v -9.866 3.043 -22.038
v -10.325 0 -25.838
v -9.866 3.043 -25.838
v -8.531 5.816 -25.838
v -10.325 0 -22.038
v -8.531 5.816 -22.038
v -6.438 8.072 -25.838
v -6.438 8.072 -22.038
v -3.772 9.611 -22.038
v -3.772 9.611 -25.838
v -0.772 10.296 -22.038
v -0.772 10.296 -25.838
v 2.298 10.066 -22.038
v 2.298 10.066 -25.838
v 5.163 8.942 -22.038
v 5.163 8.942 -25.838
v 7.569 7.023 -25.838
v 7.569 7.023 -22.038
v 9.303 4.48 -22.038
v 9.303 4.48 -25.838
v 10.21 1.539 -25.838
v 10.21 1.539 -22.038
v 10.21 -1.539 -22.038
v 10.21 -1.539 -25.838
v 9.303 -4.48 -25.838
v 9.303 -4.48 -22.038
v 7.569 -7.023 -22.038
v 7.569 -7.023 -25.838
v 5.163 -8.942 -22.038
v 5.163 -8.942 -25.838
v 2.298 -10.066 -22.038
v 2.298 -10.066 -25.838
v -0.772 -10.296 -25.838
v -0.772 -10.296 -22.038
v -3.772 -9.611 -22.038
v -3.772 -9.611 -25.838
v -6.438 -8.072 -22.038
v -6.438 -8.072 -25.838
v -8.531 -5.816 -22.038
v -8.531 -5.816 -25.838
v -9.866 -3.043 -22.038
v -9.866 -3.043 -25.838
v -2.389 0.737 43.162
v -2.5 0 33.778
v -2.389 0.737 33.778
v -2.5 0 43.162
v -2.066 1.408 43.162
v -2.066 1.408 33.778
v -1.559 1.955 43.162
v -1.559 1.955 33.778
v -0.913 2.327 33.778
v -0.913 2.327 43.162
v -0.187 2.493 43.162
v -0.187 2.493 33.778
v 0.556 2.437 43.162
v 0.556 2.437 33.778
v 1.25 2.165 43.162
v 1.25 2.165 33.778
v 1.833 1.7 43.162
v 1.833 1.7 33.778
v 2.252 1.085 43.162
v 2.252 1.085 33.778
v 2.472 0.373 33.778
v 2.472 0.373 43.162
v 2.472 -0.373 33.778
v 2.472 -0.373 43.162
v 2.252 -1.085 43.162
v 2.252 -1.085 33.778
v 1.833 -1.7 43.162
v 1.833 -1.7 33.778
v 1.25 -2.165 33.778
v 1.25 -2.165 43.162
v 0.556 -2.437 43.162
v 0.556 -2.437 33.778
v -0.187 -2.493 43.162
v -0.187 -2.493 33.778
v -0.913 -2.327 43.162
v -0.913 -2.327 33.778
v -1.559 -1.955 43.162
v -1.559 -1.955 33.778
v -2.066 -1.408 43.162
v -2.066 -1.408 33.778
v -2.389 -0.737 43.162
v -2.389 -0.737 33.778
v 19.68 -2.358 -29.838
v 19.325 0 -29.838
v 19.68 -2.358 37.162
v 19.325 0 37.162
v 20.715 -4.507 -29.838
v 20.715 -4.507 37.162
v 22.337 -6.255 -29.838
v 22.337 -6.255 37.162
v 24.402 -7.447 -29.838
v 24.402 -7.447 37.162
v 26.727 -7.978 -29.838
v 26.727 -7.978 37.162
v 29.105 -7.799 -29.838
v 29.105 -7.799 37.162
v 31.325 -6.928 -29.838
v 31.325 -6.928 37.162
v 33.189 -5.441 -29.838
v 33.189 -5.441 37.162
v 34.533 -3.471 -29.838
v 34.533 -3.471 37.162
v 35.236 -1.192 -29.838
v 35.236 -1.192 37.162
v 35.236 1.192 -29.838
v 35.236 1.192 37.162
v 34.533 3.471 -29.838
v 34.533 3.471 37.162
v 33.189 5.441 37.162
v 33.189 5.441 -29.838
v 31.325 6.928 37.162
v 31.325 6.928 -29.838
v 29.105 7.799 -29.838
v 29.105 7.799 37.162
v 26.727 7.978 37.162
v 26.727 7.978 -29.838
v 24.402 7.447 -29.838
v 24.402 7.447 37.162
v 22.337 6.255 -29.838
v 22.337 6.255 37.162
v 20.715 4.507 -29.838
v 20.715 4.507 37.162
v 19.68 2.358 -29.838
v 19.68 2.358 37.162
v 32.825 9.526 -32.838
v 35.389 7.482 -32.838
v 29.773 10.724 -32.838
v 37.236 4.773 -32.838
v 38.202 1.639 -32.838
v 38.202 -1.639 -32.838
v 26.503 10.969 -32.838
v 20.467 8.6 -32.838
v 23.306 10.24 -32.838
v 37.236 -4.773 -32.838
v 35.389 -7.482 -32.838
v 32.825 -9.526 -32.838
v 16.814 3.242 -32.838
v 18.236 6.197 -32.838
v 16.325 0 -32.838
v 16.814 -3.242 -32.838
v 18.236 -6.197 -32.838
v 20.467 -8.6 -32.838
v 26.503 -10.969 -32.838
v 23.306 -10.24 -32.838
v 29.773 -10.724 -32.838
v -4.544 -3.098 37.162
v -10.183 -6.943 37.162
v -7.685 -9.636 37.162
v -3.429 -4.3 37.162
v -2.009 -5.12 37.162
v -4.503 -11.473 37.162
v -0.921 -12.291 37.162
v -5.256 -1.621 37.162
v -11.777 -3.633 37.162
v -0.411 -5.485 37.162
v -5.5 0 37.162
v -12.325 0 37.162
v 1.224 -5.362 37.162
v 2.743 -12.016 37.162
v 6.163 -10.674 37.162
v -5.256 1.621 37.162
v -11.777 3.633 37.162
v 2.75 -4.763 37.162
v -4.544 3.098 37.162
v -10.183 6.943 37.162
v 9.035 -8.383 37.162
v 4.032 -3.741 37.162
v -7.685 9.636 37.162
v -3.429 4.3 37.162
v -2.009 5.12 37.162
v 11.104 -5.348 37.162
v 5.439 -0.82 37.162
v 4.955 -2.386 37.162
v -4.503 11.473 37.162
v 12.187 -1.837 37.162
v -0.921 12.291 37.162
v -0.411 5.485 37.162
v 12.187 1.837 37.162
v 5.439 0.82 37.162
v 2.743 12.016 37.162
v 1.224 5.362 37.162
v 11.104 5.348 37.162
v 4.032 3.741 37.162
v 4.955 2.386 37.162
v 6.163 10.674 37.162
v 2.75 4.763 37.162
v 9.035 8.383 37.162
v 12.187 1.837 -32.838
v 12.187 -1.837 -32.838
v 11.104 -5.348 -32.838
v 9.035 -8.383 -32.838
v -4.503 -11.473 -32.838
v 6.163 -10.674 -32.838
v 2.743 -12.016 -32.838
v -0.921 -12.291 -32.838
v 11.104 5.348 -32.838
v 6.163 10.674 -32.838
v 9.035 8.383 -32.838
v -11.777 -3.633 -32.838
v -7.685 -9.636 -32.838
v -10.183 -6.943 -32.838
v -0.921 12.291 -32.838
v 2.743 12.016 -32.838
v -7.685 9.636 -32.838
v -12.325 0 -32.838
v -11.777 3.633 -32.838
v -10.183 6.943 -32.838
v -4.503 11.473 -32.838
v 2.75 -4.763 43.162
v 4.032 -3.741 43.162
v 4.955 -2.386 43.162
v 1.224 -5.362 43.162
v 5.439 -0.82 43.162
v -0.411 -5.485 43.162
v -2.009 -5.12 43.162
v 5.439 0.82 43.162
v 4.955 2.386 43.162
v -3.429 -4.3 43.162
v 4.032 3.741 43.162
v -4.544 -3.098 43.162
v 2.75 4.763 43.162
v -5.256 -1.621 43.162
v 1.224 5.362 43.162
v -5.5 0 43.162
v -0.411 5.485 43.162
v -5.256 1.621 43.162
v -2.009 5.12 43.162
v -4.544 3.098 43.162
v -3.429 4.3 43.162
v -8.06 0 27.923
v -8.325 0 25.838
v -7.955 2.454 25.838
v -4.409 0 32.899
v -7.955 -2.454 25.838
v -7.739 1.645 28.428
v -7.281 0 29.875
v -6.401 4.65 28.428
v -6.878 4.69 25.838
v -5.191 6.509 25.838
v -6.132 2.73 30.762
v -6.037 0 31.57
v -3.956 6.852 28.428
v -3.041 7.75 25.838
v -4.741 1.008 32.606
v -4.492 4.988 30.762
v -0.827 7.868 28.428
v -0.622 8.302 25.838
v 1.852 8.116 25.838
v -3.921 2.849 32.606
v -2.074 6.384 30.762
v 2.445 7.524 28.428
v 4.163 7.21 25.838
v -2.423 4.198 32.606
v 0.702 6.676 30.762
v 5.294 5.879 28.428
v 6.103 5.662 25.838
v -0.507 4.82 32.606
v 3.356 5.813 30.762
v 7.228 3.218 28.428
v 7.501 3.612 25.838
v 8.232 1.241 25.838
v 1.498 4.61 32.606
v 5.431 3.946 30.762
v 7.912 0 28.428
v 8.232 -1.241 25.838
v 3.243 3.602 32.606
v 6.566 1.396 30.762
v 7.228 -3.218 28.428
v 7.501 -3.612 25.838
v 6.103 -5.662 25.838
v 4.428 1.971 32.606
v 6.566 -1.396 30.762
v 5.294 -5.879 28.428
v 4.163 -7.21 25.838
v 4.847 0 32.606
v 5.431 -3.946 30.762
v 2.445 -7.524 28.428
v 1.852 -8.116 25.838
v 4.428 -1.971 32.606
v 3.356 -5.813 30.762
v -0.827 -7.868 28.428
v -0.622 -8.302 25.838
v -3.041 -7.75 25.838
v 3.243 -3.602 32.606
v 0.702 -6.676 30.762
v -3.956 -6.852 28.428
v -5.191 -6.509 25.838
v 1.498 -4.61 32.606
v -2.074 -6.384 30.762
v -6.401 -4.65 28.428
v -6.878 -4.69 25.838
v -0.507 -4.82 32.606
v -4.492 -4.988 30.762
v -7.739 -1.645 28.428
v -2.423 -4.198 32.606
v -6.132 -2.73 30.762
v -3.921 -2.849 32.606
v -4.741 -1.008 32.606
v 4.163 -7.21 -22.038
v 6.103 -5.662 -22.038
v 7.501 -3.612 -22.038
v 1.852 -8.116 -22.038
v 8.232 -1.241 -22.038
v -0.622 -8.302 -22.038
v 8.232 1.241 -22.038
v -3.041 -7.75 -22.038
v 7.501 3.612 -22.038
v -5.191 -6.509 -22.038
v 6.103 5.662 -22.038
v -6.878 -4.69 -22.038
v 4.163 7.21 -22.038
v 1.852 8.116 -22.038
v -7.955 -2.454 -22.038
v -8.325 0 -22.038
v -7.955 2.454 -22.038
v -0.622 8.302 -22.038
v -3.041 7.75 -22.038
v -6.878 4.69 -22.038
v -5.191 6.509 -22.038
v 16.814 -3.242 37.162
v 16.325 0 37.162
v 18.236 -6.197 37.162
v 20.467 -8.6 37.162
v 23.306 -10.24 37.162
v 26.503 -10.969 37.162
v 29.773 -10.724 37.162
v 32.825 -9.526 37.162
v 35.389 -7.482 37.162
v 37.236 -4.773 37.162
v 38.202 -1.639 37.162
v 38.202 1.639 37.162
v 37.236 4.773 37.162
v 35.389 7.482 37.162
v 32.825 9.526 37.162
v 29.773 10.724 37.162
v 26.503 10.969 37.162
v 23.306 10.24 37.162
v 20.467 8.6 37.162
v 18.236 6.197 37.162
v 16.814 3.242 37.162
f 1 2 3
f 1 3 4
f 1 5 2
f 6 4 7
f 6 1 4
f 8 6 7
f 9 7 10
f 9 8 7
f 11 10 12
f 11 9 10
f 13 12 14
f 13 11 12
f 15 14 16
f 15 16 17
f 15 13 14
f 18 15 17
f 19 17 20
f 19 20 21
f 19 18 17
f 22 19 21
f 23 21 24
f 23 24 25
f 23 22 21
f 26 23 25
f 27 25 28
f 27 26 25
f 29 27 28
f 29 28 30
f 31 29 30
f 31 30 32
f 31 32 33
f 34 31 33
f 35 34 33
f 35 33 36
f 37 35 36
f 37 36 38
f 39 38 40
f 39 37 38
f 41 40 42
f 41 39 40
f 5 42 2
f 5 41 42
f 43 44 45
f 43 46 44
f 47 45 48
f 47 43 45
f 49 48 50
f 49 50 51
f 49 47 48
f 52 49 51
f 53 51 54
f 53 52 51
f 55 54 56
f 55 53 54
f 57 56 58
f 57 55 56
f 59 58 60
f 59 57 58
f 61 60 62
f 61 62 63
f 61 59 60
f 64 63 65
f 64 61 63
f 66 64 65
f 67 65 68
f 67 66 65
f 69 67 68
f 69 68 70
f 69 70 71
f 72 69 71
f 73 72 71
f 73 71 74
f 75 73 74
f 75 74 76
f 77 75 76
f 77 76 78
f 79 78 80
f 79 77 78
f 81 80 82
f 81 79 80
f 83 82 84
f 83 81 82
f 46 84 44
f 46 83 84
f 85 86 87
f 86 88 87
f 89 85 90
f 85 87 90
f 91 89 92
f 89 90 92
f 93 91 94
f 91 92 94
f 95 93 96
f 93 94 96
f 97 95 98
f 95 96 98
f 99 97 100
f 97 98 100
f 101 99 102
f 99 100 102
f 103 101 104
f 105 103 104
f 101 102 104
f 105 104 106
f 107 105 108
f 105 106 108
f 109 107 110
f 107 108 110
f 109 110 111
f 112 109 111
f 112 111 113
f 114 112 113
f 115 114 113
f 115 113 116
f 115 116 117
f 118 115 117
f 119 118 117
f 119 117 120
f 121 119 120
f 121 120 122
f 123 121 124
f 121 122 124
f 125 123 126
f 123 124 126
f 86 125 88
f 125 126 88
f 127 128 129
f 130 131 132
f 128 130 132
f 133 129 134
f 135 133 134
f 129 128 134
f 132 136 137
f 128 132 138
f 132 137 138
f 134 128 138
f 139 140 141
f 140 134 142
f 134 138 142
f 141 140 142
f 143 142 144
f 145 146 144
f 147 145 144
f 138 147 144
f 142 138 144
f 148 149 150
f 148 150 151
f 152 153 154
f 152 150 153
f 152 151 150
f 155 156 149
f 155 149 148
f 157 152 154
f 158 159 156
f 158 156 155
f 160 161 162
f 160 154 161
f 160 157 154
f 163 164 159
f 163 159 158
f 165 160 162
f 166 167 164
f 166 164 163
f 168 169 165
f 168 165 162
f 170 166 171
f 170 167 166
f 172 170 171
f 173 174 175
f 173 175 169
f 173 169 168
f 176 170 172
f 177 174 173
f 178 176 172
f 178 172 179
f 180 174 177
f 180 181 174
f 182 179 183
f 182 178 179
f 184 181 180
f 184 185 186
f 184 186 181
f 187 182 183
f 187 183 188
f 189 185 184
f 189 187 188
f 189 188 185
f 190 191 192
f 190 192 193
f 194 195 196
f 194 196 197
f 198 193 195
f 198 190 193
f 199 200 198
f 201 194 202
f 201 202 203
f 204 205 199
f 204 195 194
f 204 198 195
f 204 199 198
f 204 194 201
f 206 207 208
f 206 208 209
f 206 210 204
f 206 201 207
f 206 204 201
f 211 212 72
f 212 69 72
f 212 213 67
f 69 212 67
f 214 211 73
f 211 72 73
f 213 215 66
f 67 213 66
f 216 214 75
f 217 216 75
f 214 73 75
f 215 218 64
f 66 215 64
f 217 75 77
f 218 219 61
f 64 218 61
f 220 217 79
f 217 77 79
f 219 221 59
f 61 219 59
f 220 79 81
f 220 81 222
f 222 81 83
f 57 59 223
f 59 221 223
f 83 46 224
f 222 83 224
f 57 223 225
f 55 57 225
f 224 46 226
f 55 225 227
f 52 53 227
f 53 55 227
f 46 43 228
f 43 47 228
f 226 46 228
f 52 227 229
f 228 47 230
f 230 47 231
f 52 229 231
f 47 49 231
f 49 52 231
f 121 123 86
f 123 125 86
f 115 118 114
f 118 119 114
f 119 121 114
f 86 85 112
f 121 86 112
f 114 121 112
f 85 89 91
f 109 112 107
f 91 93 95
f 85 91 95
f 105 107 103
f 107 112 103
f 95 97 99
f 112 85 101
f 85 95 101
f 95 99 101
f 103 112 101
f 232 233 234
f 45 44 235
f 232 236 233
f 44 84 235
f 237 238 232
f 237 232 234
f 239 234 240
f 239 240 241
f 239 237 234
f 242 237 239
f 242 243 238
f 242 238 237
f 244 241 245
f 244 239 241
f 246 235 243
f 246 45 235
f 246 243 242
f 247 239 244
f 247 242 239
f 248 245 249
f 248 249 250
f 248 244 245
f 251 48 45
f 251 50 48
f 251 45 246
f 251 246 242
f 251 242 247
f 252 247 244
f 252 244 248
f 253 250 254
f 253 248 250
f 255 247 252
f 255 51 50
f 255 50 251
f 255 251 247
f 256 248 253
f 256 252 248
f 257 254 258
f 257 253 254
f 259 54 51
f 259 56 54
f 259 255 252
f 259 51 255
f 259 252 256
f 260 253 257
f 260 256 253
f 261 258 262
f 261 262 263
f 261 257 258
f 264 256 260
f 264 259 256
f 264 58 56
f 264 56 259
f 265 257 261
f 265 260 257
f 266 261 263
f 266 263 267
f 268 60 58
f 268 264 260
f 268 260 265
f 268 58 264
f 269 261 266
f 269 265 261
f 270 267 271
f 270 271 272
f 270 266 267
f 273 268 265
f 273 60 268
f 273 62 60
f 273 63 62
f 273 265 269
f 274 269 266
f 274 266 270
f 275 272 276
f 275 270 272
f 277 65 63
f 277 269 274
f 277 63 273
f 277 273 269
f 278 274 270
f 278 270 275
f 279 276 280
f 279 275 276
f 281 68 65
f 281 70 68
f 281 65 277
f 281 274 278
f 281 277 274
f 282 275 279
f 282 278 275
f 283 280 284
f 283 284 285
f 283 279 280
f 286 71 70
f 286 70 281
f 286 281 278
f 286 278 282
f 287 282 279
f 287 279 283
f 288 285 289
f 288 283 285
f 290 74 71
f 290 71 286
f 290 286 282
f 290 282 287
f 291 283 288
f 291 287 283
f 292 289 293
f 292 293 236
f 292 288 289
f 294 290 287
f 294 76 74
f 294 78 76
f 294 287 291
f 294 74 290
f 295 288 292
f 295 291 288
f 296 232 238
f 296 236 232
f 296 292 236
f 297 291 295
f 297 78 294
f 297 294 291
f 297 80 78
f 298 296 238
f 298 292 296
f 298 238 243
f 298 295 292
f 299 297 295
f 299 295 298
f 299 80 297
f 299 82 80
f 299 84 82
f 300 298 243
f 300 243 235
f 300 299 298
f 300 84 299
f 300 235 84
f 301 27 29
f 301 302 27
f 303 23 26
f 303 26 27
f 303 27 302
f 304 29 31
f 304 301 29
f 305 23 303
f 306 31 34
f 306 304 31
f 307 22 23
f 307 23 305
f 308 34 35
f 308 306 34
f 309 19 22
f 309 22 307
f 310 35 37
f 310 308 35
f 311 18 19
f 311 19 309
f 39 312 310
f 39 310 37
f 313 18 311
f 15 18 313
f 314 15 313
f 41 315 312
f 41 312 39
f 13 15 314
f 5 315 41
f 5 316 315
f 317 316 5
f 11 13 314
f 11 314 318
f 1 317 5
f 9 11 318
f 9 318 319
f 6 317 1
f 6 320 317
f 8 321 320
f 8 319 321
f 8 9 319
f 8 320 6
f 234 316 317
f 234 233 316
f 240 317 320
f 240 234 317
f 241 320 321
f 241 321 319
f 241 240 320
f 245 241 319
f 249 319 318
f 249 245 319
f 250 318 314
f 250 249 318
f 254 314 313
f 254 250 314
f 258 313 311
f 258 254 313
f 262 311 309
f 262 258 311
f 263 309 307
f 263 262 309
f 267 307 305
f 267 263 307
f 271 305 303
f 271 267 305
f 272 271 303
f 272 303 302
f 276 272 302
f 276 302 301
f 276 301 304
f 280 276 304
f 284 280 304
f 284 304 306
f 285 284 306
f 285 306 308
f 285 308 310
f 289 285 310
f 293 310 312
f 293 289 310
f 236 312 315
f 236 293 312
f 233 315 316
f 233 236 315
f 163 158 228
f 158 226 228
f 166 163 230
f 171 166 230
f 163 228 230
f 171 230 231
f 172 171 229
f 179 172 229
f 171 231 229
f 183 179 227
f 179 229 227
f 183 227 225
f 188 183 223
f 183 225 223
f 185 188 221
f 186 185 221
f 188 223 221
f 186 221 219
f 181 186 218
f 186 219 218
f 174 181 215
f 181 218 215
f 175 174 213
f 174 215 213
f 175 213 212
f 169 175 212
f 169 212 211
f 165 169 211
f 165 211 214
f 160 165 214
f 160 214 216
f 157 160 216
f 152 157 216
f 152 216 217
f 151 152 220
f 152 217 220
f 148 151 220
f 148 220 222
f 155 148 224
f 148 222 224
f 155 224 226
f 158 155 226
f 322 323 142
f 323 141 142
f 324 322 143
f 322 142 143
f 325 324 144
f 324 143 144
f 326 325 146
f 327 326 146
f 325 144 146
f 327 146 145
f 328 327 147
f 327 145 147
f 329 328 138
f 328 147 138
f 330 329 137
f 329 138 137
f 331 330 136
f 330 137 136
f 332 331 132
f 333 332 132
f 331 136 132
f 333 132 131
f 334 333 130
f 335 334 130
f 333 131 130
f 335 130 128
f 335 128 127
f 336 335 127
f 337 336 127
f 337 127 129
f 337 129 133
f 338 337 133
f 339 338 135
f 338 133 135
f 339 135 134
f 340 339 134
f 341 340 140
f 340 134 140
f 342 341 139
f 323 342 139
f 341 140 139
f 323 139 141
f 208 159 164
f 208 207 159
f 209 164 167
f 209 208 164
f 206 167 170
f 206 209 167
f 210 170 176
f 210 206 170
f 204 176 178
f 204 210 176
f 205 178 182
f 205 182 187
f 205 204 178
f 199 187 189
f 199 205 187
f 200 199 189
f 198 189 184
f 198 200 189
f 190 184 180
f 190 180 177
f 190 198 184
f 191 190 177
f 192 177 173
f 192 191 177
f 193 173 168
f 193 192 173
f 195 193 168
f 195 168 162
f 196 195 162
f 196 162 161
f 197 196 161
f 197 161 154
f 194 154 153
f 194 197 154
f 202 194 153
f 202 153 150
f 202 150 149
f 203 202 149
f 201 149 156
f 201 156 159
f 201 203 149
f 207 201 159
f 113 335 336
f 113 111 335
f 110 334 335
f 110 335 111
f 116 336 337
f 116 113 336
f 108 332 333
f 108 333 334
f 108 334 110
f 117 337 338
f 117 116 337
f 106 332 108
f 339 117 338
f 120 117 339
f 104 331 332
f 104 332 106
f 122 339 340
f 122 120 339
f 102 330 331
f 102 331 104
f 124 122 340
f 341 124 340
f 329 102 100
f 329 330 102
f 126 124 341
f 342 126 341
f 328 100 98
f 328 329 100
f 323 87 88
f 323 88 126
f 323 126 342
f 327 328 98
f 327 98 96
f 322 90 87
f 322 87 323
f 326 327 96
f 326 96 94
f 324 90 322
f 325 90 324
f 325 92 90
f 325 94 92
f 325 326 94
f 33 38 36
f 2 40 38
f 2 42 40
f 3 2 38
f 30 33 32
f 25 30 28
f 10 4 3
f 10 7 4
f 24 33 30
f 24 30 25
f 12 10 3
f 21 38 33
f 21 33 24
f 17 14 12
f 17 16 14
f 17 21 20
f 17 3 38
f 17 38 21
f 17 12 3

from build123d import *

# Parameters (mm, degrees)
F0_W   = 3
F0_H   = 6
F0_H_2 = 4


# Not quite as in the source:
# - a feature of the source that left no trace in its solid (it failed there, or was rolled back) is left out


with BuildPart() as f1:
    # F0 (on Front) → F1 (revolve)
    with BuildSketch(Plane.XZ):
        with BuildLine():
            Line((-8.325, -22.0375), (-8.325, 25.8375))
            ThreePointArc((-8.325, 25.8375), (-6.7126047478, 30.7615798633), (-2.5, 33.7782572057))
            Line((-2.5, 33.7782572057), (-2.5, 37.1625))
            Line((-2.5, 37.1625), (-5.5, 37.1625))
            Line((-5.5, 37.1625), (-12.325, 37.1625))
            Line((-12.325, 37.1625), (-12.325, -32.8375))
            Line((-12.325, -32.8375), (0, -32.8375))
            Line((0, -32.8375), (0, -26.8375))
            Line((0, -26.8375), (0, -25.8375))
            Line((0, -25.8375), (-8.325, -25.8375))
            Line((-8.325, -25.8375), (-10.325, -25.8375))
            Line((-10.325, -25.8375), (-10.325, -22.0375))
            Line((-10.325, -22.0375), (-8.325, -22.0375))
        make_face()
        with Locations((-4, 40.1625)):
            Rectangle(F0_W, F0_H)
    revolve(axis=Axis((0, 0, -29.3375), (0, 0, -1)))


with BuildPart() as f4:
    # F0 (on Front) → F4 (revolve)
    with BuildSketch(Plane.XZ):
        Polygon((19.325, 33.1625), (16.325, 33.1625), (16.325, -32.8375), (27.325, -32.8375), (27.325, -29.8375), (19.325, -29.8375), align=None)
        with Locations((17.825, 35.1625)):
            Rectangle(F0_W, F0_H_2)
    revolve(axis=Axis((27.325, 0, -31.3375), (0, 0, 1)))


solid = Compound([f1.part, f4.part])
